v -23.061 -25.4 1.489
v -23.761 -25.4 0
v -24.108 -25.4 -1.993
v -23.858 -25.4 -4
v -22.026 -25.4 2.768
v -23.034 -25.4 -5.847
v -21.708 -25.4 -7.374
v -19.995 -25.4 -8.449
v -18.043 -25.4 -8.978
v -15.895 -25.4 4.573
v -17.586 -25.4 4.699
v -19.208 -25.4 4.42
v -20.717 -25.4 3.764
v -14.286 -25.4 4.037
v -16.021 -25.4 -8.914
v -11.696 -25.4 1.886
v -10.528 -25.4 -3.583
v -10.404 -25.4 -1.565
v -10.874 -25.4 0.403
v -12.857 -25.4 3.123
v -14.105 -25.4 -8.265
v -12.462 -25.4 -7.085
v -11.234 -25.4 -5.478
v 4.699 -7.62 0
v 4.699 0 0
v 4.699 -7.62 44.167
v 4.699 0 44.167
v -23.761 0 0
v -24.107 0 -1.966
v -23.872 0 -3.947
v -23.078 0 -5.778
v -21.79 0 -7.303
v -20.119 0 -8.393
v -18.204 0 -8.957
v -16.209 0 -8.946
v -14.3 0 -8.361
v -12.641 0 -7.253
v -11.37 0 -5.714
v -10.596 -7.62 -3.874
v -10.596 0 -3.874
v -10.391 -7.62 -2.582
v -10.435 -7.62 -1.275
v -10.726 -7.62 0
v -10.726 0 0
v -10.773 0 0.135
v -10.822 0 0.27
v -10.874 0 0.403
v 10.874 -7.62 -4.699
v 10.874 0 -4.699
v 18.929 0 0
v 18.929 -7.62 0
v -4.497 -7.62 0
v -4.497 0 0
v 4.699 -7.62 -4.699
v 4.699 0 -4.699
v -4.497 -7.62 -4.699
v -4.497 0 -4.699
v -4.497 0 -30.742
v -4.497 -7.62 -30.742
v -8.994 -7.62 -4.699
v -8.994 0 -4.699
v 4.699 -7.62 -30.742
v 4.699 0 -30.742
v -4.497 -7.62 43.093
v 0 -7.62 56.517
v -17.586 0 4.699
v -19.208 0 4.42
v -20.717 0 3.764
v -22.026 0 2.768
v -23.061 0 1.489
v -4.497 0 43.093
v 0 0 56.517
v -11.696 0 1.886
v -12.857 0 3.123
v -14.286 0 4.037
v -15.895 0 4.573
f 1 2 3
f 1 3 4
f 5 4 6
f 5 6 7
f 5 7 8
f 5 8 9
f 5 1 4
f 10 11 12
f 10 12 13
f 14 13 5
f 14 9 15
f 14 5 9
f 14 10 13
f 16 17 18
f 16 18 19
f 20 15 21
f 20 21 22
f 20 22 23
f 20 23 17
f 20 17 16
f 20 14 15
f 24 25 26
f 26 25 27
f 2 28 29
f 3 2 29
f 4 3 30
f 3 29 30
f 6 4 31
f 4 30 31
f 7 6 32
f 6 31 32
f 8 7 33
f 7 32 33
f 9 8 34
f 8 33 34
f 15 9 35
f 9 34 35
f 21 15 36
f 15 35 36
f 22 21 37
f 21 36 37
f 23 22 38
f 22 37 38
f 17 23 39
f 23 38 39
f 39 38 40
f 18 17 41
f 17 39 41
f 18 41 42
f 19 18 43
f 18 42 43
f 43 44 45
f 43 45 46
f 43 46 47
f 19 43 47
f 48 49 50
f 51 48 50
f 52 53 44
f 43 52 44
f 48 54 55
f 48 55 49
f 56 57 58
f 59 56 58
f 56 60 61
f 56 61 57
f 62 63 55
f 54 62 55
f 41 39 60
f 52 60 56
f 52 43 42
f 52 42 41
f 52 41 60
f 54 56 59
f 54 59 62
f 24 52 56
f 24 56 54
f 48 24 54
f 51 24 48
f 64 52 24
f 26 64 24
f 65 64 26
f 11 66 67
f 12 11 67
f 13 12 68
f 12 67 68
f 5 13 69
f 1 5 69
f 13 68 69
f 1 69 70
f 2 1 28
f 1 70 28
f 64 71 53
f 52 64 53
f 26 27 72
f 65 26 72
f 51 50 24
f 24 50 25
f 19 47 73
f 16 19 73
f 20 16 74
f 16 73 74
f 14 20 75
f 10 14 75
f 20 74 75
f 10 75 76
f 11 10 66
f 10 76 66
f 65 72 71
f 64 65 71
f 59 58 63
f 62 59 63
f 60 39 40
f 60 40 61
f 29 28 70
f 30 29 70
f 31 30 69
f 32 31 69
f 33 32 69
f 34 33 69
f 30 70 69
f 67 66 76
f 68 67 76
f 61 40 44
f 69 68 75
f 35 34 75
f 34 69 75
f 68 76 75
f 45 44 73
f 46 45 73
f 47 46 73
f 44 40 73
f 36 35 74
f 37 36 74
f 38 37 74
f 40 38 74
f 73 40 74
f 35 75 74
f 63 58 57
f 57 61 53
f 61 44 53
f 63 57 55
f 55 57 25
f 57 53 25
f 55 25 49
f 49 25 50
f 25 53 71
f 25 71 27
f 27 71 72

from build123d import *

# Parameters (mm, degrees)
F1_DEPTH = 7.62
F2_DEPTH = 25.4
F4_DEPTH = 25.4
F6_DEPTH = 25.4


with BuildPart() as f1:
    # F0 (on Front) → F1 (new body)
    with BuildSketch(Plane.XZ):
        Polygon((0, -4.6985740773), (0, 0), (-4.4972063042, 0), (-18.1230716407, 0), align=None)
        Polygon((4.698574543, 0), (0, 0), (0, -4.6985740773), (4.698574543, -4.6985740773), (18.9285408705, 0), (10.8738420531, 0), align=None)
        Polygon((-4.4972063042, 0), (0, 0), (4.698574543, 0), (4.698574543, 44.1665910184), (0, 56.5171316266), (-4.4972063042, 43.0926345289), (-4.4972063042, 26.4462586492), align=None)
        with BuildLine():
            Line((4.698574543, -4.6985740773), (0, -4.6985740773))
            Line((0, -4.6985740773), (-4.4972063042, -4.6985740773))
            Line((-4.4972063042, -4.6985740773), (-4.4972063042, -7.9204533249))
            add(Edge.make_bspline(
                [(-4.4972063042, -7.9204533249), (-3.0188959312, -8.9298356018), (-0.076765682, -10.9387061232), (3.1120295895, -9.4610912419), (4.698574543, -8.7259225547)],
                knots=[0, 0, 0, 0, 0.5024625859, 1, 1, 1, 1], degree=3))
            Line((4.698574543, -8.7259225547), (4.698574543, -4.6985740773))
        make_face()
        Polygon((-4.4972063042, -4.6985740773), (0, -4.6985740773), (-18.1230716407, 0), (-8.9944126084, -4.6985740773), align=None)
        Polygon((18.9285408705, 0), (4.698574543, -4.6985740773), (10.8738420531, -4.6985740773), align=None)
        with BuildLine():
            add(Edge.make_bspline(
                [(-4.4972063042, -7.9204533249), (-3.0188959312, -8.9298356018), (-0.076765682, -10.9387061232), (3.1120295895, -9.4610912419), (4.698574543, -8.7259225547)],
                knots=[0, 0, 0, 0, 0.5024625859, 1, 1, 1, 1], degree=3))
            Line((-4.4972063042, -7.9204533249), (-4.4972063042, -12.2162923217))
            add(Edge.make_bspline(
                [(-4.4972063042, -12.2162923217), (-3.0081701645, -13.4176450734), (-0.0043271069, -15.841142413), (3.1220001254, -13.4314667708), (4.698574543, -12.2162923217)],
                knots=[0, 0, 0, 0, 0.4957103654, 1, 1, 1, 1], degree=3))
            Line((4.698574543, -12.2162923217), (4.698574543, -8.7259225547))
        make_face()
        with BuildLine():
            add(Edge.make_bspline(
                [(-4.4972063042, -12.2162923217), (-3.0081701645, -13.4176450734), (-0.0043271069, -15.841142413), (3.1220001254, -13.4314667708), (4.698574543, -12.2162923217)],
                knots=[0, 0, 0, 0, 0.4957103654, 1, 1, 1, 1], degree=3))
            Line((-4.4972063042, -12.2162923217), (-4.4972063042, -17.720336793))
            add(Edge.make_bspline(
                [(-4.4972063042, -17.720336793), (-3.009588296, -19.5245403943), (-0.0141265995, -23.1574775803), (3.1206187826, -19.5408569928), (4.698574543, -17.720336793)],
                knots=[0, 0, 0, 0, 0.4966239461, 1, 1, 1, 1], degree=3))
            Line((4.698574543, -17.720336793), (4.698574543, -12.2162923217))
        make_face()
        with BuildLine():
            add(Edge.make_bspline(
                [(-4.4972063042, -17.720336793), (-3.009588296, -19.5245403943), (-0.0141265995, -23.1574775803), (3.1206187826, -19.5408569928), (4.698574543, -17.720336793)],
                knots=[0, 0, 0, 0, 0.4966239461, 1, 1, 1, 1], degree=3))
            Line((-4.4972063042, -17.720336793), (-4.4972063042, -24.8353201896))
            add(Edge.make_bspline(
                [(-4.4972063042, -24.8353201896), (-3.0004006611, -25.540556717), (0.0506661056, -26.9781005566), (3.1299428272, -25.2027364557), (4.698574543, -24.2983382195)],
                knots=[0, 0, 0, 0, 0.490584362, 1, 1, 1, 1], degree=3))
            Line((4.698574543, -24.2983382195), (4.698574543, -17.720336793))
        make_face()
        with BuildLine():
            add(Edge.make_bspline(
                [(-4.4972063042, -24.8353201896), (-3.0004006611, -25.540556717), (0.0506661056, -26.9781005566), (3.1299428272, -25.2027364557), (4.698574543, -24.2983382195)],
                knots=[0, 0, 0, 0, 0.490584362, 1, 1, 1, 1], degree=3))
            Line((-4.4972063042, -24.8353201896), (-4.4972063042, -30.7420995086))
            Line((-4.4972063042, -30.7420995086), (0, -30.7420995086))
            Line((0, -30.7420995086), (4.698574543, -30.7420995086))
            Line((4.698574543, -30.7420995086), (4.698574543, -24.2983382195))
        make_face()
    extrude(amount=F1_DEPTH)

    # F2 (add): a face of the model
    f2_faces = [f1.faces().sort_by_distance(p)[0] for p in [
        (0.1945490667, -7.62, 8.4784905135),
    ]]
    extrude(f2_faces, amount=F2_DEPTH)

    # F3 (on face) → F4 (cut)
    with BuildSketch(Plane.XZ.offset(33.02)):
        Polygon((-8.9944126084, -4.6985740773), (-4.4972063042, -4.6985740773), (-4.4972063042, -30.7420995086), (4.698574543, -30.7420995086), (4.698574543, -4.6985740773), (10.8738420531, -4.6985740773), (18.9285408705, 0), (4.698574543, 0), (4.698574543, 44.1665910184), (0, 56.5171316266), (-4.4972063042, 43.0926345289), (-4.4972063042, 0), (-18.1230716407, 0), align=None)
    extrude(amount=-F4_DEPTH, mode=Mode.SUBTRACT)

    # F5 (on Front) → F6 (join)
    with BuildSketch(Plane.XZ):
        with BuildLine():
            ThreePointArc((-17.5860915333, 4.6985740773), (-21.4011571542, 3.3053396825), (-23.7613599747, 0))
            ThreePointArc((-23.7613599747, 0), (-17.0294068149, -9.0208482643), (-10.8738420531, 0.4027348768))
            ThreePointArc((-10.8738420531, 0.4027348768), (-13.5428980412, 3.6241995188), (-17.5860915333, 4.6985740773))
        make_face()
    extrude(amount=F6_DEPTH)


solid = f1.part
